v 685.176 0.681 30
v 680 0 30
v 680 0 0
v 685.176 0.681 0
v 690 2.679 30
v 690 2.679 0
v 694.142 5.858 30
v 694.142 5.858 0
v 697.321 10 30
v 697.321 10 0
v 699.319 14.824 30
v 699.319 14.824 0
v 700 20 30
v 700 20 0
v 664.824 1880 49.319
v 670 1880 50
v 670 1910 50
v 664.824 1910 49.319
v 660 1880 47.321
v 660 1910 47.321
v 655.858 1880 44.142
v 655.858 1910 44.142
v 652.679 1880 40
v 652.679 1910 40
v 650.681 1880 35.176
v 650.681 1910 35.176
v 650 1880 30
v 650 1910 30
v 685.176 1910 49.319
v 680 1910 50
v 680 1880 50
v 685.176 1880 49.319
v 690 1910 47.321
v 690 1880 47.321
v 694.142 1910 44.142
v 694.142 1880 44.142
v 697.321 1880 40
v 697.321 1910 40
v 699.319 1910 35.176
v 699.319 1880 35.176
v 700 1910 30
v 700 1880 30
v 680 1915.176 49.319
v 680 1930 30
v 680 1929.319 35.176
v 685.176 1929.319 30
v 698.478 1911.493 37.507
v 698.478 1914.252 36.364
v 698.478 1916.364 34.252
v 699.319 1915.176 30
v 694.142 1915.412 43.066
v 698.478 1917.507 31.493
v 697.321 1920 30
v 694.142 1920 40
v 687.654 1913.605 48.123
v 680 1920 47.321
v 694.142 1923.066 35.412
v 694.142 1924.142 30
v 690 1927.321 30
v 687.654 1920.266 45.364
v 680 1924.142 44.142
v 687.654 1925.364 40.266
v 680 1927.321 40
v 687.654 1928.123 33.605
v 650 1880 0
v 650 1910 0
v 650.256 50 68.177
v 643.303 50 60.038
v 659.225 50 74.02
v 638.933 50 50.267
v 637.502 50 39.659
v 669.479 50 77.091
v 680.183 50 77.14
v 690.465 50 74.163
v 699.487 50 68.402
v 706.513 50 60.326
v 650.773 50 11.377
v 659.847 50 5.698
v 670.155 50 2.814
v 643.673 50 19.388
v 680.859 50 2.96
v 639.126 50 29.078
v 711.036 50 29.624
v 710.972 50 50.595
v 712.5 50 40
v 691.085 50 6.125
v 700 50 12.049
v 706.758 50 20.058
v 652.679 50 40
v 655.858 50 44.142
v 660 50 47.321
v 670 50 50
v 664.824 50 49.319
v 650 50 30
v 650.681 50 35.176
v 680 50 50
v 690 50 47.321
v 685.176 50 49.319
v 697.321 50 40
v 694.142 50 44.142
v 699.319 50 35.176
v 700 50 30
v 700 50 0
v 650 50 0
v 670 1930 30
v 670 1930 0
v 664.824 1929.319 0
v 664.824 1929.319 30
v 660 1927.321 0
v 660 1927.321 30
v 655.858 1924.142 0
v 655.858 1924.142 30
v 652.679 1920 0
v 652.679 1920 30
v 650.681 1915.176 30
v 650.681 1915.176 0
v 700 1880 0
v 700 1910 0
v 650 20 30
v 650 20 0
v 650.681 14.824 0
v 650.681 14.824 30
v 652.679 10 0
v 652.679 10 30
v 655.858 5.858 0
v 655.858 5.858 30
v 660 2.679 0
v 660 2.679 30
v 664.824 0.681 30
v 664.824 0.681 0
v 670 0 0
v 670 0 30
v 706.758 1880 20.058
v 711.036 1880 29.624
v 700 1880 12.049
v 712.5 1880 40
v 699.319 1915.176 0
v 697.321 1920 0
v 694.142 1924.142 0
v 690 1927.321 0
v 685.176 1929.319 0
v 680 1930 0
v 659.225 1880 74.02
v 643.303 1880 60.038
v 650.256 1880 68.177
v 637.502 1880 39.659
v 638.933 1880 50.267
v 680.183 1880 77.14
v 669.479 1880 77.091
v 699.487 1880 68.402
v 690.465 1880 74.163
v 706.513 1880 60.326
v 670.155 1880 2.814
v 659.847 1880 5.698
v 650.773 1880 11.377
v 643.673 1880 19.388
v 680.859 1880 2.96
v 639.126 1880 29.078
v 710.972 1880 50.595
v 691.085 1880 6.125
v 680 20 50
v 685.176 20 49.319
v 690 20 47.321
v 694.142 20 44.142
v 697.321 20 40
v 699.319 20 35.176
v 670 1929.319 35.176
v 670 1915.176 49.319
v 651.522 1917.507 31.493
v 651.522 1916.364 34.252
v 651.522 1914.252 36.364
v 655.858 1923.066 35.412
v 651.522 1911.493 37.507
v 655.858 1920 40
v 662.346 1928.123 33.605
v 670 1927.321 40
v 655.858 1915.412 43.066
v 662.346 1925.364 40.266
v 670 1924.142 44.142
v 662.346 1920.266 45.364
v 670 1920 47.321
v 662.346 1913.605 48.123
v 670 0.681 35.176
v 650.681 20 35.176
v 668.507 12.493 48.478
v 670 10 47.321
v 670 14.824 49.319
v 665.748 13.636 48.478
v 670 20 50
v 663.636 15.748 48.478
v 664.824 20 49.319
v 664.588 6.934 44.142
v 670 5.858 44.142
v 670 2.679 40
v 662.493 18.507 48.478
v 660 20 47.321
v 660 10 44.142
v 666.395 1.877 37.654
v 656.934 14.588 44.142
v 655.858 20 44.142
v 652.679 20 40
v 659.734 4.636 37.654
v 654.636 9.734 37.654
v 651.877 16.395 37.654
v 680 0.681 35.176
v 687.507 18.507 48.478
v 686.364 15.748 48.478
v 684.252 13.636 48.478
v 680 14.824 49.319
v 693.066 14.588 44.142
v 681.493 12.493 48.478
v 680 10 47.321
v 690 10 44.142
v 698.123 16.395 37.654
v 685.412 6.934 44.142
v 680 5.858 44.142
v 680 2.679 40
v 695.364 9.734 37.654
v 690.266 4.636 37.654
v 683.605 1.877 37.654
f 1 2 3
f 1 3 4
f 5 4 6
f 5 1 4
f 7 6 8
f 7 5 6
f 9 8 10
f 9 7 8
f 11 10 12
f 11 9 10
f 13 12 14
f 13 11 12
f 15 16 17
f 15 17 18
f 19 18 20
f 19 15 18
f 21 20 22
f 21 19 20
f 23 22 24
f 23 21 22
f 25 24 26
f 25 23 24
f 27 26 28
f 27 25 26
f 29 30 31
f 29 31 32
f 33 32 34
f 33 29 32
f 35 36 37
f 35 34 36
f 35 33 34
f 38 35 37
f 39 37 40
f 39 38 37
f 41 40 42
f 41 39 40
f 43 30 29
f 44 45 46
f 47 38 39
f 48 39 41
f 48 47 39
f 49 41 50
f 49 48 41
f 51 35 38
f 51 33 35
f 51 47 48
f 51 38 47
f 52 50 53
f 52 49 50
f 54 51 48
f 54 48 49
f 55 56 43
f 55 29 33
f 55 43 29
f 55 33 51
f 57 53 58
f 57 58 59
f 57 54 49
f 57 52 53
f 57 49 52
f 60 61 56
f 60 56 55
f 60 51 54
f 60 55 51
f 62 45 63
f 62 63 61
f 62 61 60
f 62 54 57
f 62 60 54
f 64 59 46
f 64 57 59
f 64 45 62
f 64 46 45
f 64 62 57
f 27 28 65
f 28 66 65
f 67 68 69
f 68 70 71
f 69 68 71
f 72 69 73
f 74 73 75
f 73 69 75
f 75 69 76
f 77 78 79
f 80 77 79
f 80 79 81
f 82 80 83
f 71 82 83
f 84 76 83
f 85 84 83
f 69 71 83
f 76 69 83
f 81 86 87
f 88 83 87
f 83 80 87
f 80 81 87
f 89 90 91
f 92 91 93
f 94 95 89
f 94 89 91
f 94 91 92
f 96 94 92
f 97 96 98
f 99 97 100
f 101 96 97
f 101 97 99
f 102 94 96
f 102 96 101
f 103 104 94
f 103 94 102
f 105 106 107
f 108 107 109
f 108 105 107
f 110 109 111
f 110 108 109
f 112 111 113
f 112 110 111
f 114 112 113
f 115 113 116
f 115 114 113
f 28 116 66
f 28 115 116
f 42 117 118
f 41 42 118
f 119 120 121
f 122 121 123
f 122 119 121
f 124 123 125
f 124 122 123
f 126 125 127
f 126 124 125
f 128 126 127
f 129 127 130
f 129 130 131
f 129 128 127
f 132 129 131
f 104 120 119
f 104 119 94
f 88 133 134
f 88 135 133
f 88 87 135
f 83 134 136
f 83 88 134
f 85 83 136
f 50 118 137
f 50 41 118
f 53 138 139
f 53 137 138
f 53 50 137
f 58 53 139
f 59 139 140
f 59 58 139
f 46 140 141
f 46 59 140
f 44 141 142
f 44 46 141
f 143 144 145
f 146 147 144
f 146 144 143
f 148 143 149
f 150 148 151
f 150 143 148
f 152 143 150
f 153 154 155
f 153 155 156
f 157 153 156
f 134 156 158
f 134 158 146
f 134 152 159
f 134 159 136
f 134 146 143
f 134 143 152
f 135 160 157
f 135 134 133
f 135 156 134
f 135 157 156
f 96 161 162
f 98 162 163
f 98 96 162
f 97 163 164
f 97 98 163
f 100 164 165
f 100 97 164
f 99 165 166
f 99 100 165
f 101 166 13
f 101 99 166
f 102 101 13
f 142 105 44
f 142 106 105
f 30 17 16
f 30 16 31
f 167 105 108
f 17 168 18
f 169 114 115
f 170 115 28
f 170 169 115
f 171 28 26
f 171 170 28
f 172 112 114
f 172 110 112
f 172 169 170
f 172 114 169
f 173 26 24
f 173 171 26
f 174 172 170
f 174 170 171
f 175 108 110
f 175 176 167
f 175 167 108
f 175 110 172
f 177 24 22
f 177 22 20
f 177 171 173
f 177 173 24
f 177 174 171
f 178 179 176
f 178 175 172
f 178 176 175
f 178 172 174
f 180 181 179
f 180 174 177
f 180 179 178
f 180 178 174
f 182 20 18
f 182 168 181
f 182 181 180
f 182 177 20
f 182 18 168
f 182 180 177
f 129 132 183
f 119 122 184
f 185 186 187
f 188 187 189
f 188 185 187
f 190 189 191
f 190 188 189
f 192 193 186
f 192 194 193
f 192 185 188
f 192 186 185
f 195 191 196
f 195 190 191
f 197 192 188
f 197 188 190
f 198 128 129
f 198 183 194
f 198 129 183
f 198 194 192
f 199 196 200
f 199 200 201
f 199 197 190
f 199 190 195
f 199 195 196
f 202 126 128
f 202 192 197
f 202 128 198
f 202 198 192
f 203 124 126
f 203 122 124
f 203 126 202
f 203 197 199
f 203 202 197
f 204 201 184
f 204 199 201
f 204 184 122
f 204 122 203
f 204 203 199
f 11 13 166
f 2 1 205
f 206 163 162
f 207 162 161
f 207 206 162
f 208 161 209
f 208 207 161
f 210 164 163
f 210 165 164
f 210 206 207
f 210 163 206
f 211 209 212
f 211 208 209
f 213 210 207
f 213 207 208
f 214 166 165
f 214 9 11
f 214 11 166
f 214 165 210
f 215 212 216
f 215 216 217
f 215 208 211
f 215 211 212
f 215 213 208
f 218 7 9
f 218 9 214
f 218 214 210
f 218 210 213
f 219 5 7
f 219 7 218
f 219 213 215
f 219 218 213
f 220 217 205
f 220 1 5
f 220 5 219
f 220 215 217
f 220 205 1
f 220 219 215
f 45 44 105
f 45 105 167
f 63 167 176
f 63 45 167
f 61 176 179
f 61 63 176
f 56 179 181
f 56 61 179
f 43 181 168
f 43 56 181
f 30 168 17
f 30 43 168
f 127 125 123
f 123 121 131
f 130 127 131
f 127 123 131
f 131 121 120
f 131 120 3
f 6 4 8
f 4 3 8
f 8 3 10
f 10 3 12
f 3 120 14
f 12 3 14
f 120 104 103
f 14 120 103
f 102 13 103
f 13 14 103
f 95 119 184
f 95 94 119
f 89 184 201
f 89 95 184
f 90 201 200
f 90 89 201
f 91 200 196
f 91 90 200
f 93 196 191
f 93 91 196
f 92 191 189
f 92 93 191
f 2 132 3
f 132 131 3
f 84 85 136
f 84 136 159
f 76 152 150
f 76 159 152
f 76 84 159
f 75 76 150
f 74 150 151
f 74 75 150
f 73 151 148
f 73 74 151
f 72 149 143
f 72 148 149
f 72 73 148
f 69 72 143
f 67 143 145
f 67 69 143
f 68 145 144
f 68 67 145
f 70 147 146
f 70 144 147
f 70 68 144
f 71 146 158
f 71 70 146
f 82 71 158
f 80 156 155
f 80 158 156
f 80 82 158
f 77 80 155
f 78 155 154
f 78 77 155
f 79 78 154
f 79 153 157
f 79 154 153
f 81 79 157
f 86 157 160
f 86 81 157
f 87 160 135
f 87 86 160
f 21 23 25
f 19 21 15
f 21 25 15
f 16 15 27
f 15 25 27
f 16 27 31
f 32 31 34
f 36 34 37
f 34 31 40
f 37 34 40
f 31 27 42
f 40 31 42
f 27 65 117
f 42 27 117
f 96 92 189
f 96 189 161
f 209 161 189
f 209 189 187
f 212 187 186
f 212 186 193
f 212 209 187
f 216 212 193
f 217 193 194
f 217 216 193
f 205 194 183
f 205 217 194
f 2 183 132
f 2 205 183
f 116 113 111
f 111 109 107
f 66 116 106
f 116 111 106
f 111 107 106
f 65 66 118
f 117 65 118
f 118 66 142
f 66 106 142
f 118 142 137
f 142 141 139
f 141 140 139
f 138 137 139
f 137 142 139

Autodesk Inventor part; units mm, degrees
ref_plane "YZ Plane" through (0, 0, 0) normal (1, 0, 0) x (0, 1, 0)
ref_plane "XZ Plane" through (0, 0, 0) normal (0, 1, 0) x (-1, 0, 0)
ref_plane "XY Plane" through (0, 0, 0) normal (0, 0, 1) x (1, 0, 0)
ref_plane "Work Plane1" through (0, 0, 0) normal (0, 0, 1) x (1, 0, 0)
sketch "Sketch1" plane through (0, 0, 0) normal (0, 0, 1) x (1, 0, 0)
  line L0 (0, 0) -> (700, 0) projected
  line L1 (700, 0) -> (700, 1930) projected
  line L2 (0, 1930) -> (700, 1930) projected
  line L3 (0, 0) -> (0, 1930) projected
  line L4 (700, 0) -> (650, 0)
  line L5 (650, 0) -> (650, 50)
  line L6 (650, 50) -> (700, 50)
  line L7 (700, 50) -> (700, 0)
  line L8 (700, 1930) -> (650, 1930)
  line L9 (650, 1930) -> (650, 1880)
  line L10 (650, 1880) -> (700, 1880)
  line L11 (700, 1880) -> (700, 1930)
  point P0 (650, 1930)
  dimension "d0" = 50
  dimension "d1" = 50
  dimension "d2" = 50
extrude "Extrusion1" add sketch "Sketch1" along normal blind 50 contours L5 L6 L1 L0 | L2 L1 L10 L9
fillet "Fillet1" radius 20 10 edges at (700, 0, 25) (650, 0, 25) (675, 0, 50) (650, 25, 50) (700, 25, 50) (675, 1930, 50) (700, 1930, 25) (700, 1905, 50) (650, 1905, 50) (650, 1930, 25)
sketch "Sketch2" plane through (650, 50, 0) normal (0, 1, 0) x (1, 0, 0)
  circle A0 centre (25, -40) radius 37.5
  line L0 (50, 0) -> (0, 0) projected
  line L1 (-22.934, -16.6175) -> (-13.936, -55.5923) projected
  line L2 (50, 0) -> (50, -30) projected
  point P0 (-650, 0)
  dimension "d6" = 40
  dimension "d7" = 25
  dimension "d8" = 75
extrude "Extrusion2" add sketch "Sketch2" along normal up to surface (1830 mm away) separate body
properties part number "canvas-cover-stowed-V2"
